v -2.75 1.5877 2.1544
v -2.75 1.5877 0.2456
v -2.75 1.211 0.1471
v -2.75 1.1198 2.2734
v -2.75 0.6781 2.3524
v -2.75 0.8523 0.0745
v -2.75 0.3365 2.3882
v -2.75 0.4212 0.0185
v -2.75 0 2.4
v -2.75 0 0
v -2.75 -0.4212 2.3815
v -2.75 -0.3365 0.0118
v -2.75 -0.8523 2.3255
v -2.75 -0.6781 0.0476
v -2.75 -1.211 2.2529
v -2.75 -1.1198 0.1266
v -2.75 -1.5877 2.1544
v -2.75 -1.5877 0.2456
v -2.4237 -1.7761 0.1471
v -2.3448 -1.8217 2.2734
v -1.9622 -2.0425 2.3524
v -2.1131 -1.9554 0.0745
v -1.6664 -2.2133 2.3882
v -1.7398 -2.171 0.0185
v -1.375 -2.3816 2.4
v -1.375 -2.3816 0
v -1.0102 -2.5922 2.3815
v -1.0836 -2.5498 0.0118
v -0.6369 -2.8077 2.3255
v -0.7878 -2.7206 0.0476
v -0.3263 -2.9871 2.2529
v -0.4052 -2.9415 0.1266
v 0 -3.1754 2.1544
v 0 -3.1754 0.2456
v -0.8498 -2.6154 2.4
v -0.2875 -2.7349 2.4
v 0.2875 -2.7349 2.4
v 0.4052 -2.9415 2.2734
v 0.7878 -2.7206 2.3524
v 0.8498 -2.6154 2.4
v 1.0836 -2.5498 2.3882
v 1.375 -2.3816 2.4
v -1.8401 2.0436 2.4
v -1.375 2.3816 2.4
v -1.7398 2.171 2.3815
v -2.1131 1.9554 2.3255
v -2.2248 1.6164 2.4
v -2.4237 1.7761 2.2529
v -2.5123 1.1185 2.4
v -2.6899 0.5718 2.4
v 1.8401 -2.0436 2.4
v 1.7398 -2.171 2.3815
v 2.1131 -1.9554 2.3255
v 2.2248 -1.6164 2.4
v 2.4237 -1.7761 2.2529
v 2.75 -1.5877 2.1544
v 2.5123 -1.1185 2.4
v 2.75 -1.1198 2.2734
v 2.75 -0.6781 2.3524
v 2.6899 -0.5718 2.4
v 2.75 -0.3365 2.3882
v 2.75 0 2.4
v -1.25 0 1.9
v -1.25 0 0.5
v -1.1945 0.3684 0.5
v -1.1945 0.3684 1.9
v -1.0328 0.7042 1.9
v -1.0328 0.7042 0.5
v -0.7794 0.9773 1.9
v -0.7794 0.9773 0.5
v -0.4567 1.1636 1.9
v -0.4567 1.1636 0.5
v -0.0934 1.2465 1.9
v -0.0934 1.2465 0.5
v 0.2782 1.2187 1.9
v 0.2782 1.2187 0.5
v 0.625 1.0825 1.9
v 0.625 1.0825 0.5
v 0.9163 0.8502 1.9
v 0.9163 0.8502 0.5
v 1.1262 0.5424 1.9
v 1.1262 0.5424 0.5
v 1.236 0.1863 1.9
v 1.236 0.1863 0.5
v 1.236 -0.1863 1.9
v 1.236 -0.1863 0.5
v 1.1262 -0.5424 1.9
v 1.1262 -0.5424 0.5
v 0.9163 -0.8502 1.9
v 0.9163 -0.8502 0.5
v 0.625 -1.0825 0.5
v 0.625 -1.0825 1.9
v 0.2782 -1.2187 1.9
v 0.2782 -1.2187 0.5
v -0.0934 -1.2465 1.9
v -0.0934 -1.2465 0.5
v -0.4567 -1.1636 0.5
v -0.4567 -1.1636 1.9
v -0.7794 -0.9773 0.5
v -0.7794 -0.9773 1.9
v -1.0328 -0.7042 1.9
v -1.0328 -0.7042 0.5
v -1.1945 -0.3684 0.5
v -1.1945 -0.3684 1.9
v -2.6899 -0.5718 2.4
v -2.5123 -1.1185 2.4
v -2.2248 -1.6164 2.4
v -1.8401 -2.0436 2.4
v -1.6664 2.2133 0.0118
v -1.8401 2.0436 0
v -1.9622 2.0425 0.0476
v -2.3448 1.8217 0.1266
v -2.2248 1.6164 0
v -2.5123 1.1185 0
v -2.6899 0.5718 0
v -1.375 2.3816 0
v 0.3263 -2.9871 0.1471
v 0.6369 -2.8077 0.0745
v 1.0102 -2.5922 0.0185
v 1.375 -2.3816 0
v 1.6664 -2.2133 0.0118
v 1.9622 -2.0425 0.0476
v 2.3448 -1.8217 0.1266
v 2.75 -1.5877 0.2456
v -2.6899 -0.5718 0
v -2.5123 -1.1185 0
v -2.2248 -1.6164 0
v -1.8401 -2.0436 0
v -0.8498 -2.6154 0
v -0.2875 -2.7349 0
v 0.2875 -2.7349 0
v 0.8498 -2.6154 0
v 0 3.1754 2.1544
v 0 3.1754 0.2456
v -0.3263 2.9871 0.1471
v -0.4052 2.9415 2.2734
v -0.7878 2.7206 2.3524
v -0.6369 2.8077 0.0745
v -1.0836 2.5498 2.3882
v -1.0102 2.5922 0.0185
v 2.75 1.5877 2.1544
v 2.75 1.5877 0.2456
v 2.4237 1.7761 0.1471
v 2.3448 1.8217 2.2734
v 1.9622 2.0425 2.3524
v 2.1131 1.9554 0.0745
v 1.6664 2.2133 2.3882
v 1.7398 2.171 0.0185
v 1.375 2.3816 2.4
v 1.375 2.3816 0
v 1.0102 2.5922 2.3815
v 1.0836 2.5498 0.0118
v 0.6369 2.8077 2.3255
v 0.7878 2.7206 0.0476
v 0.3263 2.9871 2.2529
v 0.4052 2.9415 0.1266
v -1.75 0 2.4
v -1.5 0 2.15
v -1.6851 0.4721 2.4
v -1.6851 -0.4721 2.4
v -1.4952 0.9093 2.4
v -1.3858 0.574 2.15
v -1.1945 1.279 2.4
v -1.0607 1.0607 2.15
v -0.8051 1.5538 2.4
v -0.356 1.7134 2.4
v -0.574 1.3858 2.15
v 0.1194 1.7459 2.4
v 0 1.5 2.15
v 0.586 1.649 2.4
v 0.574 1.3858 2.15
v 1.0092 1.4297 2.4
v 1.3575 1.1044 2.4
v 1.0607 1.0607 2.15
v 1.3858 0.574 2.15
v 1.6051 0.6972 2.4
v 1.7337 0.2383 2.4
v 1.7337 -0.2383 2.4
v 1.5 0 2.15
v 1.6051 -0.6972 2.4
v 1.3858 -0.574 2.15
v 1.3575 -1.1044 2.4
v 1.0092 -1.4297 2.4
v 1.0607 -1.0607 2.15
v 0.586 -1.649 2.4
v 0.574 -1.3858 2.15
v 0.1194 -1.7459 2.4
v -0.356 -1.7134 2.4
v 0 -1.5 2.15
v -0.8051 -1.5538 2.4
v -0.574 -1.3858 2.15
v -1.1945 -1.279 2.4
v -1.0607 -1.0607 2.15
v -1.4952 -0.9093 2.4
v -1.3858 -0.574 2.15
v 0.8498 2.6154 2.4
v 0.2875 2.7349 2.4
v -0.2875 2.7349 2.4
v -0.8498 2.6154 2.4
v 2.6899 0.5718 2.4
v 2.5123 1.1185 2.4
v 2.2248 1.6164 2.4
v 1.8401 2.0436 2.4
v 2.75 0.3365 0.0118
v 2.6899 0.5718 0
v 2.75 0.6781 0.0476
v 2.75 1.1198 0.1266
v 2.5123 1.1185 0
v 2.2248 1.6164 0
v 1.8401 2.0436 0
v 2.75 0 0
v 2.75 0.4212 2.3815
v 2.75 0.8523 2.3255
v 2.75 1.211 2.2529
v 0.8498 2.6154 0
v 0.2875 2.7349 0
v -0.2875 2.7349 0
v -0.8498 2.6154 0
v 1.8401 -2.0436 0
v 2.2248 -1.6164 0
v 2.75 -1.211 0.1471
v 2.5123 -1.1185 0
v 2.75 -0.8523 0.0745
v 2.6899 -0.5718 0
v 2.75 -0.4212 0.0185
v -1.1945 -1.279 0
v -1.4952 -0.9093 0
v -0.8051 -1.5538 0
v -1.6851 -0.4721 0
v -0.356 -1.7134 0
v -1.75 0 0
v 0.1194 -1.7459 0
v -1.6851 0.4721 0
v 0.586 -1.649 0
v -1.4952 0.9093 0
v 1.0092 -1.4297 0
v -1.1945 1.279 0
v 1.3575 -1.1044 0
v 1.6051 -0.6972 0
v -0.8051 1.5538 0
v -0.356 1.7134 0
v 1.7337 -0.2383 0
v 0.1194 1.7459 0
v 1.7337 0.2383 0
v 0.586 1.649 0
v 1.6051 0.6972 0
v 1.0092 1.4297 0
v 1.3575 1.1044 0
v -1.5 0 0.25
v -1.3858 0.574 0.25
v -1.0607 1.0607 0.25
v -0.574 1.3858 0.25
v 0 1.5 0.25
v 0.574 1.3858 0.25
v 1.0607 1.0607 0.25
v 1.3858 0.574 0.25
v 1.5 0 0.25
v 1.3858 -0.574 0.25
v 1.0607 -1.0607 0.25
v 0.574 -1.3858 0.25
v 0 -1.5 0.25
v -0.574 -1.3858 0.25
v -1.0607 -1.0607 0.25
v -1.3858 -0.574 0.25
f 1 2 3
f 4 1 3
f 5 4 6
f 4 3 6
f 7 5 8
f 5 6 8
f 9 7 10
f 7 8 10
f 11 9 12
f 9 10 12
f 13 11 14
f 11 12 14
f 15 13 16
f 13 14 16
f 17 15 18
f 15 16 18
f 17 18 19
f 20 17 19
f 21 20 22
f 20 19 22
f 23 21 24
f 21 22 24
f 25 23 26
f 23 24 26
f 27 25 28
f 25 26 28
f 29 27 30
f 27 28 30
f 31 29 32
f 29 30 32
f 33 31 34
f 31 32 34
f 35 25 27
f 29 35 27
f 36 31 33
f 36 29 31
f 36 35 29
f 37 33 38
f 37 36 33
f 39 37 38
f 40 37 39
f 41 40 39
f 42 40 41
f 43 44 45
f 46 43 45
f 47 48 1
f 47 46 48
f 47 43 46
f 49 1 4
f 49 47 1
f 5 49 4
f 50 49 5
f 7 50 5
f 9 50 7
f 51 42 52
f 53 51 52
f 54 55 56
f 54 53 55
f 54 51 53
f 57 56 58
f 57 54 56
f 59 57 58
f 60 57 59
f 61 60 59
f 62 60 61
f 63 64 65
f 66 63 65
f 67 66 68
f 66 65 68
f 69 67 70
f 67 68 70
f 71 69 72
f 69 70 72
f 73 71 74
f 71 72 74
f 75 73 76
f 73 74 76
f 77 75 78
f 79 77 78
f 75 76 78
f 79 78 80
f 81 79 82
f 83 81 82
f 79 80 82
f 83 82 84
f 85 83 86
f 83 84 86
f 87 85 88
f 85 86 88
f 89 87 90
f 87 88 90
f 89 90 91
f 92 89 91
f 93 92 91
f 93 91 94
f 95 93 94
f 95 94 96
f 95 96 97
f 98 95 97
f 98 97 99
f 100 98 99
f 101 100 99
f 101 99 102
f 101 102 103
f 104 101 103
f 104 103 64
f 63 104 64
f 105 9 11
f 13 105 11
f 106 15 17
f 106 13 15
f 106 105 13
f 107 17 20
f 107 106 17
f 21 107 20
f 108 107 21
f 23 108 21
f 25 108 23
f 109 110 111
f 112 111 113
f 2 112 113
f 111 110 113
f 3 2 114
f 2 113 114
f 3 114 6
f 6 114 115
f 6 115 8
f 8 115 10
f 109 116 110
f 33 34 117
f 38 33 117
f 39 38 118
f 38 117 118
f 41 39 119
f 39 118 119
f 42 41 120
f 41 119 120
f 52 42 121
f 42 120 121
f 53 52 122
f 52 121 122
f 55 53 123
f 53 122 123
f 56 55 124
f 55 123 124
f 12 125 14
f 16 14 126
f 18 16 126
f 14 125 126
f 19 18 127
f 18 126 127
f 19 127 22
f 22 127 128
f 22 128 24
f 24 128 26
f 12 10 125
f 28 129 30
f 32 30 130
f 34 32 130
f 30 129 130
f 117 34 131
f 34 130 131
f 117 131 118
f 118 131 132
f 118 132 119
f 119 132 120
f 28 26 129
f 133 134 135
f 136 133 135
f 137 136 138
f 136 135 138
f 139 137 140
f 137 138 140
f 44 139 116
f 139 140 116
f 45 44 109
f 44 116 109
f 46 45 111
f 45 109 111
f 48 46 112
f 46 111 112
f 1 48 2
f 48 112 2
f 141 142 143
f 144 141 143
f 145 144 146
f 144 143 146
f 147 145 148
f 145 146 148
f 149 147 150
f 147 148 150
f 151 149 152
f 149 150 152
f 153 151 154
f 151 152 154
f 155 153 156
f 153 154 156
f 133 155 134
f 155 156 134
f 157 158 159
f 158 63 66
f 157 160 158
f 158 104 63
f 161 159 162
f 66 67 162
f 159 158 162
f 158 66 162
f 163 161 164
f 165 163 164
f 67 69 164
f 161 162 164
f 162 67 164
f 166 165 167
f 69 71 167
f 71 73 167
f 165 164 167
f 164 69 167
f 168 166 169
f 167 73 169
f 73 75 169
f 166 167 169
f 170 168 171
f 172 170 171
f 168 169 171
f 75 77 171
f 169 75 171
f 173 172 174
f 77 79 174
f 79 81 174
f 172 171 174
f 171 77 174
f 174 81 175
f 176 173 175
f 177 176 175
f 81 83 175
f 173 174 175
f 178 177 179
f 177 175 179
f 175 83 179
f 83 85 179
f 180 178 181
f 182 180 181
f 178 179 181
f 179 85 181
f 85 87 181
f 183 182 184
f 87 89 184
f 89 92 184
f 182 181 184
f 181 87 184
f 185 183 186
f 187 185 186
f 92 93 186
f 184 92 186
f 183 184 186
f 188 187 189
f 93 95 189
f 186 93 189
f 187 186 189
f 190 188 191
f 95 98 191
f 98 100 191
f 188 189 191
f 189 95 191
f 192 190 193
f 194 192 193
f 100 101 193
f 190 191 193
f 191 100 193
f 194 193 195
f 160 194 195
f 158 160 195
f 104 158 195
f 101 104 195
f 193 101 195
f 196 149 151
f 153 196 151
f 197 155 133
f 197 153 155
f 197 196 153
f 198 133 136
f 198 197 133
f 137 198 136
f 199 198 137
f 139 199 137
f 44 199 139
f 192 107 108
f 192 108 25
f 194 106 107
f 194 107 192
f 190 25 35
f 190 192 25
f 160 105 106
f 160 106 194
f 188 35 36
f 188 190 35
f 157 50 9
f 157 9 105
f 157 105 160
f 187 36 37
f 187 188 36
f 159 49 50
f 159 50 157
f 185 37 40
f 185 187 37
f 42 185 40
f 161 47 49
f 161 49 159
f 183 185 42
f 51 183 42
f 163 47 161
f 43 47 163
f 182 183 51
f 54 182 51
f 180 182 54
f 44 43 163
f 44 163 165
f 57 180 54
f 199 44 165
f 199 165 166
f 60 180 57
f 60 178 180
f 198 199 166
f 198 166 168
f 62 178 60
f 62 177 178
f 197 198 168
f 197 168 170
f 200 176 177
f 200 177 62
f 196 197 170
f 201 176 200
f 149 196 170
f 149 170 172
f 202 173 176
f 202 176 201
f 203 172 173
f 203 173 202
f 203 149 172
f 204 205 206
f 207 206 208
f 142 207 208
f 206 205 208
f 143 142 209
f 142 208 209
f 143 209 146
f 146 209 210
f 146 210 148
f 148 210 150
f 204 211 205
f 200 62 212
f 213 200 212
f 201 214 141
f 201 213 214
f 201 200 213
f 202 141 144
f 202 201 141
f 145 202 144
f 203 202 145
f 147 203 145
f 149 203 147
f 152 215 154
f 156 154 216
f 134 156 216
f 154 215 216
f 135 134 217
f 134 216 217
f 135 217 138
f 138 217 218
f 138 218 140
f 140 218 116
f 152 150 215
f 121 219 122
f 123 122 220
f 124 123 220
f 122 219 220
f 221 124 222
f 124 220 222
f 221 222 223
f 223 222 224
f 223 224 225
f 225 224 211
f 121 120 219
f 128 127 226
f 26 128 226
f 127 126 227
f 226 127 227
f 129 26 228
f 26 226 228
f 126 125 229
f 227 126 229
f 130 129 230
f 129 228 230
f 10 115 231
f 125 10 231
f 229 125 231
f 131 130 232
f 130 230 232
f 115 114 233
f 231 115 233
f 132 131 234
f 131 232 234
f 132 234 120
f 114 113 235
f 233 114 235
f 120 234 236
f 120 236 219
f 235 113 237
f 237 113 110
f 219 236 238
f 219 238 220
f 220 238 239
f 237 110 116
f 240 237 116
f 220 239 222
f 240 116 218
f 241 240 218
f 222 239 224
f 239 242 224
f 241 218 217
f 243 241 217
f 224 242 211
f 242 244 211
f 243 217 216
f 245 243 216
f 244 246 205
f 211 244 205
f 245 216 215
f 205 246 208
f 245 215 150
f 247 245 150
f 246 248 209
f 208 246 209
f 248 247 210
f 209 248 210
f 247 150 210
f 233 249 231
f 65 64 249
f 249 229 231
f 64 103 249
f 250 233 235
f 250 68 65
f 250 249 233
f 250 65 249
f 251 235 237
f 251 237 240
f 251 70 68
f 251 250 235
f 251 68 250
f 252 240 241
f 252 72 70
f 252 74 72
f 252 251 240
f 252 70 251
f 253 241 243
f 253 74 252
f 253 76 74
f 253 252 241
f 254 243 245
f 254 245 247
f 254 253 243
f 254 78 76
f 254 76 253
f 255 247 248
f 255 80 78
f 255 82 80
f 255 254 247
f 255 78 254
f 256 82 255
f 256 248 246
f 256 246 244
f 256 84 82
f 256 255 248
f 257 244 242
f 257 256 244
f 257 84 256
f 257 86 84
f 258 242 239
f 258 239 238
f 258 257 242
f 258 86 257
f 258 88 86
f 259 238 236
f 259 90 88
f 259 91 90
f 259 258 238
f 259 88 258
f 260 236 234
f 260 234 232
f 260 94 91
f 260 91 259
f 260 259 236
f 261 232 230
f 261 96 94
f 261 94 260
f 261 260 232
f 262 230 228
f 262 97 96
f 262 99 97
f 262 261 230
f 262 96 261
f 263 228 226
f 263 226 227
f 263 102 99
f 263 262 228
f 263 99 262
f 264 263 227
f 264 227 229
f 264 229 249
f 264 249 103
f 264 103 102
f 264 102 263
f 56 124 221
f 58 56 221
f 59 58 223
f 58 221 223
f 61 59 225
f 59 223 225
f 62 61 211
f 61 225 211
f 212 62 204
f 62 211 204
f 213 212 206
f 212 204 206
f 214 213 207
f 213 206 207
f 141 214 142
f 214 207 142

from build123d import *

# Parameters (mm, degrees)
EXTRUDE_1_DEPTH   = 2.4
HOLE_WIZARD_M31_D = 2.5
CHAMFER_1_SIZE    = 0.5


with BuildPart() as part:
    # Эскиз1 → Бобышка-Вытянуть1 (new body)
    with BuildSketch(Plane.XY):
        Polygon((2.75, 1.58771324), (0, 3.175426481), (-2.75, 1.58771324), (-2.75, -1.58771324), (0, -3.175426481), (2.75, -1.58771324), align=None)
    extrude(amount=EXTRUDE_1_DEPTH)

    # Отверстие обработанное метчиком M31 (through all)
    with Locations(Plane.XY.offset(2.4)):
        with Locations((0, 0)):
            Hole(HOLE_WIZARD_M31_D / 2)

    # Фаска1
    chamfer_1_edges = [part.edges().sort_by_distance(p)[0] for p in [
        (1.25, 0, 2.4),
        (1.25, 0, 0),
    ]]
    chamfer(chamfer_1_edges, length=CHAMFER_1_SIZE)

    # Эскиз4 → Вырез-Повернуть1 (revolve, cut)
    with BuildSketch(Plane(origin=(0, 0, 0), x_dir=(0, 0, -1), z_dir=(1, 0, 0)), mode=Mode.PRIVATE) as cut_revolve_1_sk:
        Polygon((0, 2.75), (0, 4), (-0.721687836, 4), align=None)
        Polygon((-2.4, 2.75), (-2.4, 4), (-1.678312164, 4), align=None)
    revolve(cut_revolve_1_sk.sketch.rotate(Axis((0, 0, 0), (0, 0, 1)), 270), axis=Axis((0, 0, 0), (0, 0, 1)), mode=Mode.SUBTRACT)


solid = part.part
